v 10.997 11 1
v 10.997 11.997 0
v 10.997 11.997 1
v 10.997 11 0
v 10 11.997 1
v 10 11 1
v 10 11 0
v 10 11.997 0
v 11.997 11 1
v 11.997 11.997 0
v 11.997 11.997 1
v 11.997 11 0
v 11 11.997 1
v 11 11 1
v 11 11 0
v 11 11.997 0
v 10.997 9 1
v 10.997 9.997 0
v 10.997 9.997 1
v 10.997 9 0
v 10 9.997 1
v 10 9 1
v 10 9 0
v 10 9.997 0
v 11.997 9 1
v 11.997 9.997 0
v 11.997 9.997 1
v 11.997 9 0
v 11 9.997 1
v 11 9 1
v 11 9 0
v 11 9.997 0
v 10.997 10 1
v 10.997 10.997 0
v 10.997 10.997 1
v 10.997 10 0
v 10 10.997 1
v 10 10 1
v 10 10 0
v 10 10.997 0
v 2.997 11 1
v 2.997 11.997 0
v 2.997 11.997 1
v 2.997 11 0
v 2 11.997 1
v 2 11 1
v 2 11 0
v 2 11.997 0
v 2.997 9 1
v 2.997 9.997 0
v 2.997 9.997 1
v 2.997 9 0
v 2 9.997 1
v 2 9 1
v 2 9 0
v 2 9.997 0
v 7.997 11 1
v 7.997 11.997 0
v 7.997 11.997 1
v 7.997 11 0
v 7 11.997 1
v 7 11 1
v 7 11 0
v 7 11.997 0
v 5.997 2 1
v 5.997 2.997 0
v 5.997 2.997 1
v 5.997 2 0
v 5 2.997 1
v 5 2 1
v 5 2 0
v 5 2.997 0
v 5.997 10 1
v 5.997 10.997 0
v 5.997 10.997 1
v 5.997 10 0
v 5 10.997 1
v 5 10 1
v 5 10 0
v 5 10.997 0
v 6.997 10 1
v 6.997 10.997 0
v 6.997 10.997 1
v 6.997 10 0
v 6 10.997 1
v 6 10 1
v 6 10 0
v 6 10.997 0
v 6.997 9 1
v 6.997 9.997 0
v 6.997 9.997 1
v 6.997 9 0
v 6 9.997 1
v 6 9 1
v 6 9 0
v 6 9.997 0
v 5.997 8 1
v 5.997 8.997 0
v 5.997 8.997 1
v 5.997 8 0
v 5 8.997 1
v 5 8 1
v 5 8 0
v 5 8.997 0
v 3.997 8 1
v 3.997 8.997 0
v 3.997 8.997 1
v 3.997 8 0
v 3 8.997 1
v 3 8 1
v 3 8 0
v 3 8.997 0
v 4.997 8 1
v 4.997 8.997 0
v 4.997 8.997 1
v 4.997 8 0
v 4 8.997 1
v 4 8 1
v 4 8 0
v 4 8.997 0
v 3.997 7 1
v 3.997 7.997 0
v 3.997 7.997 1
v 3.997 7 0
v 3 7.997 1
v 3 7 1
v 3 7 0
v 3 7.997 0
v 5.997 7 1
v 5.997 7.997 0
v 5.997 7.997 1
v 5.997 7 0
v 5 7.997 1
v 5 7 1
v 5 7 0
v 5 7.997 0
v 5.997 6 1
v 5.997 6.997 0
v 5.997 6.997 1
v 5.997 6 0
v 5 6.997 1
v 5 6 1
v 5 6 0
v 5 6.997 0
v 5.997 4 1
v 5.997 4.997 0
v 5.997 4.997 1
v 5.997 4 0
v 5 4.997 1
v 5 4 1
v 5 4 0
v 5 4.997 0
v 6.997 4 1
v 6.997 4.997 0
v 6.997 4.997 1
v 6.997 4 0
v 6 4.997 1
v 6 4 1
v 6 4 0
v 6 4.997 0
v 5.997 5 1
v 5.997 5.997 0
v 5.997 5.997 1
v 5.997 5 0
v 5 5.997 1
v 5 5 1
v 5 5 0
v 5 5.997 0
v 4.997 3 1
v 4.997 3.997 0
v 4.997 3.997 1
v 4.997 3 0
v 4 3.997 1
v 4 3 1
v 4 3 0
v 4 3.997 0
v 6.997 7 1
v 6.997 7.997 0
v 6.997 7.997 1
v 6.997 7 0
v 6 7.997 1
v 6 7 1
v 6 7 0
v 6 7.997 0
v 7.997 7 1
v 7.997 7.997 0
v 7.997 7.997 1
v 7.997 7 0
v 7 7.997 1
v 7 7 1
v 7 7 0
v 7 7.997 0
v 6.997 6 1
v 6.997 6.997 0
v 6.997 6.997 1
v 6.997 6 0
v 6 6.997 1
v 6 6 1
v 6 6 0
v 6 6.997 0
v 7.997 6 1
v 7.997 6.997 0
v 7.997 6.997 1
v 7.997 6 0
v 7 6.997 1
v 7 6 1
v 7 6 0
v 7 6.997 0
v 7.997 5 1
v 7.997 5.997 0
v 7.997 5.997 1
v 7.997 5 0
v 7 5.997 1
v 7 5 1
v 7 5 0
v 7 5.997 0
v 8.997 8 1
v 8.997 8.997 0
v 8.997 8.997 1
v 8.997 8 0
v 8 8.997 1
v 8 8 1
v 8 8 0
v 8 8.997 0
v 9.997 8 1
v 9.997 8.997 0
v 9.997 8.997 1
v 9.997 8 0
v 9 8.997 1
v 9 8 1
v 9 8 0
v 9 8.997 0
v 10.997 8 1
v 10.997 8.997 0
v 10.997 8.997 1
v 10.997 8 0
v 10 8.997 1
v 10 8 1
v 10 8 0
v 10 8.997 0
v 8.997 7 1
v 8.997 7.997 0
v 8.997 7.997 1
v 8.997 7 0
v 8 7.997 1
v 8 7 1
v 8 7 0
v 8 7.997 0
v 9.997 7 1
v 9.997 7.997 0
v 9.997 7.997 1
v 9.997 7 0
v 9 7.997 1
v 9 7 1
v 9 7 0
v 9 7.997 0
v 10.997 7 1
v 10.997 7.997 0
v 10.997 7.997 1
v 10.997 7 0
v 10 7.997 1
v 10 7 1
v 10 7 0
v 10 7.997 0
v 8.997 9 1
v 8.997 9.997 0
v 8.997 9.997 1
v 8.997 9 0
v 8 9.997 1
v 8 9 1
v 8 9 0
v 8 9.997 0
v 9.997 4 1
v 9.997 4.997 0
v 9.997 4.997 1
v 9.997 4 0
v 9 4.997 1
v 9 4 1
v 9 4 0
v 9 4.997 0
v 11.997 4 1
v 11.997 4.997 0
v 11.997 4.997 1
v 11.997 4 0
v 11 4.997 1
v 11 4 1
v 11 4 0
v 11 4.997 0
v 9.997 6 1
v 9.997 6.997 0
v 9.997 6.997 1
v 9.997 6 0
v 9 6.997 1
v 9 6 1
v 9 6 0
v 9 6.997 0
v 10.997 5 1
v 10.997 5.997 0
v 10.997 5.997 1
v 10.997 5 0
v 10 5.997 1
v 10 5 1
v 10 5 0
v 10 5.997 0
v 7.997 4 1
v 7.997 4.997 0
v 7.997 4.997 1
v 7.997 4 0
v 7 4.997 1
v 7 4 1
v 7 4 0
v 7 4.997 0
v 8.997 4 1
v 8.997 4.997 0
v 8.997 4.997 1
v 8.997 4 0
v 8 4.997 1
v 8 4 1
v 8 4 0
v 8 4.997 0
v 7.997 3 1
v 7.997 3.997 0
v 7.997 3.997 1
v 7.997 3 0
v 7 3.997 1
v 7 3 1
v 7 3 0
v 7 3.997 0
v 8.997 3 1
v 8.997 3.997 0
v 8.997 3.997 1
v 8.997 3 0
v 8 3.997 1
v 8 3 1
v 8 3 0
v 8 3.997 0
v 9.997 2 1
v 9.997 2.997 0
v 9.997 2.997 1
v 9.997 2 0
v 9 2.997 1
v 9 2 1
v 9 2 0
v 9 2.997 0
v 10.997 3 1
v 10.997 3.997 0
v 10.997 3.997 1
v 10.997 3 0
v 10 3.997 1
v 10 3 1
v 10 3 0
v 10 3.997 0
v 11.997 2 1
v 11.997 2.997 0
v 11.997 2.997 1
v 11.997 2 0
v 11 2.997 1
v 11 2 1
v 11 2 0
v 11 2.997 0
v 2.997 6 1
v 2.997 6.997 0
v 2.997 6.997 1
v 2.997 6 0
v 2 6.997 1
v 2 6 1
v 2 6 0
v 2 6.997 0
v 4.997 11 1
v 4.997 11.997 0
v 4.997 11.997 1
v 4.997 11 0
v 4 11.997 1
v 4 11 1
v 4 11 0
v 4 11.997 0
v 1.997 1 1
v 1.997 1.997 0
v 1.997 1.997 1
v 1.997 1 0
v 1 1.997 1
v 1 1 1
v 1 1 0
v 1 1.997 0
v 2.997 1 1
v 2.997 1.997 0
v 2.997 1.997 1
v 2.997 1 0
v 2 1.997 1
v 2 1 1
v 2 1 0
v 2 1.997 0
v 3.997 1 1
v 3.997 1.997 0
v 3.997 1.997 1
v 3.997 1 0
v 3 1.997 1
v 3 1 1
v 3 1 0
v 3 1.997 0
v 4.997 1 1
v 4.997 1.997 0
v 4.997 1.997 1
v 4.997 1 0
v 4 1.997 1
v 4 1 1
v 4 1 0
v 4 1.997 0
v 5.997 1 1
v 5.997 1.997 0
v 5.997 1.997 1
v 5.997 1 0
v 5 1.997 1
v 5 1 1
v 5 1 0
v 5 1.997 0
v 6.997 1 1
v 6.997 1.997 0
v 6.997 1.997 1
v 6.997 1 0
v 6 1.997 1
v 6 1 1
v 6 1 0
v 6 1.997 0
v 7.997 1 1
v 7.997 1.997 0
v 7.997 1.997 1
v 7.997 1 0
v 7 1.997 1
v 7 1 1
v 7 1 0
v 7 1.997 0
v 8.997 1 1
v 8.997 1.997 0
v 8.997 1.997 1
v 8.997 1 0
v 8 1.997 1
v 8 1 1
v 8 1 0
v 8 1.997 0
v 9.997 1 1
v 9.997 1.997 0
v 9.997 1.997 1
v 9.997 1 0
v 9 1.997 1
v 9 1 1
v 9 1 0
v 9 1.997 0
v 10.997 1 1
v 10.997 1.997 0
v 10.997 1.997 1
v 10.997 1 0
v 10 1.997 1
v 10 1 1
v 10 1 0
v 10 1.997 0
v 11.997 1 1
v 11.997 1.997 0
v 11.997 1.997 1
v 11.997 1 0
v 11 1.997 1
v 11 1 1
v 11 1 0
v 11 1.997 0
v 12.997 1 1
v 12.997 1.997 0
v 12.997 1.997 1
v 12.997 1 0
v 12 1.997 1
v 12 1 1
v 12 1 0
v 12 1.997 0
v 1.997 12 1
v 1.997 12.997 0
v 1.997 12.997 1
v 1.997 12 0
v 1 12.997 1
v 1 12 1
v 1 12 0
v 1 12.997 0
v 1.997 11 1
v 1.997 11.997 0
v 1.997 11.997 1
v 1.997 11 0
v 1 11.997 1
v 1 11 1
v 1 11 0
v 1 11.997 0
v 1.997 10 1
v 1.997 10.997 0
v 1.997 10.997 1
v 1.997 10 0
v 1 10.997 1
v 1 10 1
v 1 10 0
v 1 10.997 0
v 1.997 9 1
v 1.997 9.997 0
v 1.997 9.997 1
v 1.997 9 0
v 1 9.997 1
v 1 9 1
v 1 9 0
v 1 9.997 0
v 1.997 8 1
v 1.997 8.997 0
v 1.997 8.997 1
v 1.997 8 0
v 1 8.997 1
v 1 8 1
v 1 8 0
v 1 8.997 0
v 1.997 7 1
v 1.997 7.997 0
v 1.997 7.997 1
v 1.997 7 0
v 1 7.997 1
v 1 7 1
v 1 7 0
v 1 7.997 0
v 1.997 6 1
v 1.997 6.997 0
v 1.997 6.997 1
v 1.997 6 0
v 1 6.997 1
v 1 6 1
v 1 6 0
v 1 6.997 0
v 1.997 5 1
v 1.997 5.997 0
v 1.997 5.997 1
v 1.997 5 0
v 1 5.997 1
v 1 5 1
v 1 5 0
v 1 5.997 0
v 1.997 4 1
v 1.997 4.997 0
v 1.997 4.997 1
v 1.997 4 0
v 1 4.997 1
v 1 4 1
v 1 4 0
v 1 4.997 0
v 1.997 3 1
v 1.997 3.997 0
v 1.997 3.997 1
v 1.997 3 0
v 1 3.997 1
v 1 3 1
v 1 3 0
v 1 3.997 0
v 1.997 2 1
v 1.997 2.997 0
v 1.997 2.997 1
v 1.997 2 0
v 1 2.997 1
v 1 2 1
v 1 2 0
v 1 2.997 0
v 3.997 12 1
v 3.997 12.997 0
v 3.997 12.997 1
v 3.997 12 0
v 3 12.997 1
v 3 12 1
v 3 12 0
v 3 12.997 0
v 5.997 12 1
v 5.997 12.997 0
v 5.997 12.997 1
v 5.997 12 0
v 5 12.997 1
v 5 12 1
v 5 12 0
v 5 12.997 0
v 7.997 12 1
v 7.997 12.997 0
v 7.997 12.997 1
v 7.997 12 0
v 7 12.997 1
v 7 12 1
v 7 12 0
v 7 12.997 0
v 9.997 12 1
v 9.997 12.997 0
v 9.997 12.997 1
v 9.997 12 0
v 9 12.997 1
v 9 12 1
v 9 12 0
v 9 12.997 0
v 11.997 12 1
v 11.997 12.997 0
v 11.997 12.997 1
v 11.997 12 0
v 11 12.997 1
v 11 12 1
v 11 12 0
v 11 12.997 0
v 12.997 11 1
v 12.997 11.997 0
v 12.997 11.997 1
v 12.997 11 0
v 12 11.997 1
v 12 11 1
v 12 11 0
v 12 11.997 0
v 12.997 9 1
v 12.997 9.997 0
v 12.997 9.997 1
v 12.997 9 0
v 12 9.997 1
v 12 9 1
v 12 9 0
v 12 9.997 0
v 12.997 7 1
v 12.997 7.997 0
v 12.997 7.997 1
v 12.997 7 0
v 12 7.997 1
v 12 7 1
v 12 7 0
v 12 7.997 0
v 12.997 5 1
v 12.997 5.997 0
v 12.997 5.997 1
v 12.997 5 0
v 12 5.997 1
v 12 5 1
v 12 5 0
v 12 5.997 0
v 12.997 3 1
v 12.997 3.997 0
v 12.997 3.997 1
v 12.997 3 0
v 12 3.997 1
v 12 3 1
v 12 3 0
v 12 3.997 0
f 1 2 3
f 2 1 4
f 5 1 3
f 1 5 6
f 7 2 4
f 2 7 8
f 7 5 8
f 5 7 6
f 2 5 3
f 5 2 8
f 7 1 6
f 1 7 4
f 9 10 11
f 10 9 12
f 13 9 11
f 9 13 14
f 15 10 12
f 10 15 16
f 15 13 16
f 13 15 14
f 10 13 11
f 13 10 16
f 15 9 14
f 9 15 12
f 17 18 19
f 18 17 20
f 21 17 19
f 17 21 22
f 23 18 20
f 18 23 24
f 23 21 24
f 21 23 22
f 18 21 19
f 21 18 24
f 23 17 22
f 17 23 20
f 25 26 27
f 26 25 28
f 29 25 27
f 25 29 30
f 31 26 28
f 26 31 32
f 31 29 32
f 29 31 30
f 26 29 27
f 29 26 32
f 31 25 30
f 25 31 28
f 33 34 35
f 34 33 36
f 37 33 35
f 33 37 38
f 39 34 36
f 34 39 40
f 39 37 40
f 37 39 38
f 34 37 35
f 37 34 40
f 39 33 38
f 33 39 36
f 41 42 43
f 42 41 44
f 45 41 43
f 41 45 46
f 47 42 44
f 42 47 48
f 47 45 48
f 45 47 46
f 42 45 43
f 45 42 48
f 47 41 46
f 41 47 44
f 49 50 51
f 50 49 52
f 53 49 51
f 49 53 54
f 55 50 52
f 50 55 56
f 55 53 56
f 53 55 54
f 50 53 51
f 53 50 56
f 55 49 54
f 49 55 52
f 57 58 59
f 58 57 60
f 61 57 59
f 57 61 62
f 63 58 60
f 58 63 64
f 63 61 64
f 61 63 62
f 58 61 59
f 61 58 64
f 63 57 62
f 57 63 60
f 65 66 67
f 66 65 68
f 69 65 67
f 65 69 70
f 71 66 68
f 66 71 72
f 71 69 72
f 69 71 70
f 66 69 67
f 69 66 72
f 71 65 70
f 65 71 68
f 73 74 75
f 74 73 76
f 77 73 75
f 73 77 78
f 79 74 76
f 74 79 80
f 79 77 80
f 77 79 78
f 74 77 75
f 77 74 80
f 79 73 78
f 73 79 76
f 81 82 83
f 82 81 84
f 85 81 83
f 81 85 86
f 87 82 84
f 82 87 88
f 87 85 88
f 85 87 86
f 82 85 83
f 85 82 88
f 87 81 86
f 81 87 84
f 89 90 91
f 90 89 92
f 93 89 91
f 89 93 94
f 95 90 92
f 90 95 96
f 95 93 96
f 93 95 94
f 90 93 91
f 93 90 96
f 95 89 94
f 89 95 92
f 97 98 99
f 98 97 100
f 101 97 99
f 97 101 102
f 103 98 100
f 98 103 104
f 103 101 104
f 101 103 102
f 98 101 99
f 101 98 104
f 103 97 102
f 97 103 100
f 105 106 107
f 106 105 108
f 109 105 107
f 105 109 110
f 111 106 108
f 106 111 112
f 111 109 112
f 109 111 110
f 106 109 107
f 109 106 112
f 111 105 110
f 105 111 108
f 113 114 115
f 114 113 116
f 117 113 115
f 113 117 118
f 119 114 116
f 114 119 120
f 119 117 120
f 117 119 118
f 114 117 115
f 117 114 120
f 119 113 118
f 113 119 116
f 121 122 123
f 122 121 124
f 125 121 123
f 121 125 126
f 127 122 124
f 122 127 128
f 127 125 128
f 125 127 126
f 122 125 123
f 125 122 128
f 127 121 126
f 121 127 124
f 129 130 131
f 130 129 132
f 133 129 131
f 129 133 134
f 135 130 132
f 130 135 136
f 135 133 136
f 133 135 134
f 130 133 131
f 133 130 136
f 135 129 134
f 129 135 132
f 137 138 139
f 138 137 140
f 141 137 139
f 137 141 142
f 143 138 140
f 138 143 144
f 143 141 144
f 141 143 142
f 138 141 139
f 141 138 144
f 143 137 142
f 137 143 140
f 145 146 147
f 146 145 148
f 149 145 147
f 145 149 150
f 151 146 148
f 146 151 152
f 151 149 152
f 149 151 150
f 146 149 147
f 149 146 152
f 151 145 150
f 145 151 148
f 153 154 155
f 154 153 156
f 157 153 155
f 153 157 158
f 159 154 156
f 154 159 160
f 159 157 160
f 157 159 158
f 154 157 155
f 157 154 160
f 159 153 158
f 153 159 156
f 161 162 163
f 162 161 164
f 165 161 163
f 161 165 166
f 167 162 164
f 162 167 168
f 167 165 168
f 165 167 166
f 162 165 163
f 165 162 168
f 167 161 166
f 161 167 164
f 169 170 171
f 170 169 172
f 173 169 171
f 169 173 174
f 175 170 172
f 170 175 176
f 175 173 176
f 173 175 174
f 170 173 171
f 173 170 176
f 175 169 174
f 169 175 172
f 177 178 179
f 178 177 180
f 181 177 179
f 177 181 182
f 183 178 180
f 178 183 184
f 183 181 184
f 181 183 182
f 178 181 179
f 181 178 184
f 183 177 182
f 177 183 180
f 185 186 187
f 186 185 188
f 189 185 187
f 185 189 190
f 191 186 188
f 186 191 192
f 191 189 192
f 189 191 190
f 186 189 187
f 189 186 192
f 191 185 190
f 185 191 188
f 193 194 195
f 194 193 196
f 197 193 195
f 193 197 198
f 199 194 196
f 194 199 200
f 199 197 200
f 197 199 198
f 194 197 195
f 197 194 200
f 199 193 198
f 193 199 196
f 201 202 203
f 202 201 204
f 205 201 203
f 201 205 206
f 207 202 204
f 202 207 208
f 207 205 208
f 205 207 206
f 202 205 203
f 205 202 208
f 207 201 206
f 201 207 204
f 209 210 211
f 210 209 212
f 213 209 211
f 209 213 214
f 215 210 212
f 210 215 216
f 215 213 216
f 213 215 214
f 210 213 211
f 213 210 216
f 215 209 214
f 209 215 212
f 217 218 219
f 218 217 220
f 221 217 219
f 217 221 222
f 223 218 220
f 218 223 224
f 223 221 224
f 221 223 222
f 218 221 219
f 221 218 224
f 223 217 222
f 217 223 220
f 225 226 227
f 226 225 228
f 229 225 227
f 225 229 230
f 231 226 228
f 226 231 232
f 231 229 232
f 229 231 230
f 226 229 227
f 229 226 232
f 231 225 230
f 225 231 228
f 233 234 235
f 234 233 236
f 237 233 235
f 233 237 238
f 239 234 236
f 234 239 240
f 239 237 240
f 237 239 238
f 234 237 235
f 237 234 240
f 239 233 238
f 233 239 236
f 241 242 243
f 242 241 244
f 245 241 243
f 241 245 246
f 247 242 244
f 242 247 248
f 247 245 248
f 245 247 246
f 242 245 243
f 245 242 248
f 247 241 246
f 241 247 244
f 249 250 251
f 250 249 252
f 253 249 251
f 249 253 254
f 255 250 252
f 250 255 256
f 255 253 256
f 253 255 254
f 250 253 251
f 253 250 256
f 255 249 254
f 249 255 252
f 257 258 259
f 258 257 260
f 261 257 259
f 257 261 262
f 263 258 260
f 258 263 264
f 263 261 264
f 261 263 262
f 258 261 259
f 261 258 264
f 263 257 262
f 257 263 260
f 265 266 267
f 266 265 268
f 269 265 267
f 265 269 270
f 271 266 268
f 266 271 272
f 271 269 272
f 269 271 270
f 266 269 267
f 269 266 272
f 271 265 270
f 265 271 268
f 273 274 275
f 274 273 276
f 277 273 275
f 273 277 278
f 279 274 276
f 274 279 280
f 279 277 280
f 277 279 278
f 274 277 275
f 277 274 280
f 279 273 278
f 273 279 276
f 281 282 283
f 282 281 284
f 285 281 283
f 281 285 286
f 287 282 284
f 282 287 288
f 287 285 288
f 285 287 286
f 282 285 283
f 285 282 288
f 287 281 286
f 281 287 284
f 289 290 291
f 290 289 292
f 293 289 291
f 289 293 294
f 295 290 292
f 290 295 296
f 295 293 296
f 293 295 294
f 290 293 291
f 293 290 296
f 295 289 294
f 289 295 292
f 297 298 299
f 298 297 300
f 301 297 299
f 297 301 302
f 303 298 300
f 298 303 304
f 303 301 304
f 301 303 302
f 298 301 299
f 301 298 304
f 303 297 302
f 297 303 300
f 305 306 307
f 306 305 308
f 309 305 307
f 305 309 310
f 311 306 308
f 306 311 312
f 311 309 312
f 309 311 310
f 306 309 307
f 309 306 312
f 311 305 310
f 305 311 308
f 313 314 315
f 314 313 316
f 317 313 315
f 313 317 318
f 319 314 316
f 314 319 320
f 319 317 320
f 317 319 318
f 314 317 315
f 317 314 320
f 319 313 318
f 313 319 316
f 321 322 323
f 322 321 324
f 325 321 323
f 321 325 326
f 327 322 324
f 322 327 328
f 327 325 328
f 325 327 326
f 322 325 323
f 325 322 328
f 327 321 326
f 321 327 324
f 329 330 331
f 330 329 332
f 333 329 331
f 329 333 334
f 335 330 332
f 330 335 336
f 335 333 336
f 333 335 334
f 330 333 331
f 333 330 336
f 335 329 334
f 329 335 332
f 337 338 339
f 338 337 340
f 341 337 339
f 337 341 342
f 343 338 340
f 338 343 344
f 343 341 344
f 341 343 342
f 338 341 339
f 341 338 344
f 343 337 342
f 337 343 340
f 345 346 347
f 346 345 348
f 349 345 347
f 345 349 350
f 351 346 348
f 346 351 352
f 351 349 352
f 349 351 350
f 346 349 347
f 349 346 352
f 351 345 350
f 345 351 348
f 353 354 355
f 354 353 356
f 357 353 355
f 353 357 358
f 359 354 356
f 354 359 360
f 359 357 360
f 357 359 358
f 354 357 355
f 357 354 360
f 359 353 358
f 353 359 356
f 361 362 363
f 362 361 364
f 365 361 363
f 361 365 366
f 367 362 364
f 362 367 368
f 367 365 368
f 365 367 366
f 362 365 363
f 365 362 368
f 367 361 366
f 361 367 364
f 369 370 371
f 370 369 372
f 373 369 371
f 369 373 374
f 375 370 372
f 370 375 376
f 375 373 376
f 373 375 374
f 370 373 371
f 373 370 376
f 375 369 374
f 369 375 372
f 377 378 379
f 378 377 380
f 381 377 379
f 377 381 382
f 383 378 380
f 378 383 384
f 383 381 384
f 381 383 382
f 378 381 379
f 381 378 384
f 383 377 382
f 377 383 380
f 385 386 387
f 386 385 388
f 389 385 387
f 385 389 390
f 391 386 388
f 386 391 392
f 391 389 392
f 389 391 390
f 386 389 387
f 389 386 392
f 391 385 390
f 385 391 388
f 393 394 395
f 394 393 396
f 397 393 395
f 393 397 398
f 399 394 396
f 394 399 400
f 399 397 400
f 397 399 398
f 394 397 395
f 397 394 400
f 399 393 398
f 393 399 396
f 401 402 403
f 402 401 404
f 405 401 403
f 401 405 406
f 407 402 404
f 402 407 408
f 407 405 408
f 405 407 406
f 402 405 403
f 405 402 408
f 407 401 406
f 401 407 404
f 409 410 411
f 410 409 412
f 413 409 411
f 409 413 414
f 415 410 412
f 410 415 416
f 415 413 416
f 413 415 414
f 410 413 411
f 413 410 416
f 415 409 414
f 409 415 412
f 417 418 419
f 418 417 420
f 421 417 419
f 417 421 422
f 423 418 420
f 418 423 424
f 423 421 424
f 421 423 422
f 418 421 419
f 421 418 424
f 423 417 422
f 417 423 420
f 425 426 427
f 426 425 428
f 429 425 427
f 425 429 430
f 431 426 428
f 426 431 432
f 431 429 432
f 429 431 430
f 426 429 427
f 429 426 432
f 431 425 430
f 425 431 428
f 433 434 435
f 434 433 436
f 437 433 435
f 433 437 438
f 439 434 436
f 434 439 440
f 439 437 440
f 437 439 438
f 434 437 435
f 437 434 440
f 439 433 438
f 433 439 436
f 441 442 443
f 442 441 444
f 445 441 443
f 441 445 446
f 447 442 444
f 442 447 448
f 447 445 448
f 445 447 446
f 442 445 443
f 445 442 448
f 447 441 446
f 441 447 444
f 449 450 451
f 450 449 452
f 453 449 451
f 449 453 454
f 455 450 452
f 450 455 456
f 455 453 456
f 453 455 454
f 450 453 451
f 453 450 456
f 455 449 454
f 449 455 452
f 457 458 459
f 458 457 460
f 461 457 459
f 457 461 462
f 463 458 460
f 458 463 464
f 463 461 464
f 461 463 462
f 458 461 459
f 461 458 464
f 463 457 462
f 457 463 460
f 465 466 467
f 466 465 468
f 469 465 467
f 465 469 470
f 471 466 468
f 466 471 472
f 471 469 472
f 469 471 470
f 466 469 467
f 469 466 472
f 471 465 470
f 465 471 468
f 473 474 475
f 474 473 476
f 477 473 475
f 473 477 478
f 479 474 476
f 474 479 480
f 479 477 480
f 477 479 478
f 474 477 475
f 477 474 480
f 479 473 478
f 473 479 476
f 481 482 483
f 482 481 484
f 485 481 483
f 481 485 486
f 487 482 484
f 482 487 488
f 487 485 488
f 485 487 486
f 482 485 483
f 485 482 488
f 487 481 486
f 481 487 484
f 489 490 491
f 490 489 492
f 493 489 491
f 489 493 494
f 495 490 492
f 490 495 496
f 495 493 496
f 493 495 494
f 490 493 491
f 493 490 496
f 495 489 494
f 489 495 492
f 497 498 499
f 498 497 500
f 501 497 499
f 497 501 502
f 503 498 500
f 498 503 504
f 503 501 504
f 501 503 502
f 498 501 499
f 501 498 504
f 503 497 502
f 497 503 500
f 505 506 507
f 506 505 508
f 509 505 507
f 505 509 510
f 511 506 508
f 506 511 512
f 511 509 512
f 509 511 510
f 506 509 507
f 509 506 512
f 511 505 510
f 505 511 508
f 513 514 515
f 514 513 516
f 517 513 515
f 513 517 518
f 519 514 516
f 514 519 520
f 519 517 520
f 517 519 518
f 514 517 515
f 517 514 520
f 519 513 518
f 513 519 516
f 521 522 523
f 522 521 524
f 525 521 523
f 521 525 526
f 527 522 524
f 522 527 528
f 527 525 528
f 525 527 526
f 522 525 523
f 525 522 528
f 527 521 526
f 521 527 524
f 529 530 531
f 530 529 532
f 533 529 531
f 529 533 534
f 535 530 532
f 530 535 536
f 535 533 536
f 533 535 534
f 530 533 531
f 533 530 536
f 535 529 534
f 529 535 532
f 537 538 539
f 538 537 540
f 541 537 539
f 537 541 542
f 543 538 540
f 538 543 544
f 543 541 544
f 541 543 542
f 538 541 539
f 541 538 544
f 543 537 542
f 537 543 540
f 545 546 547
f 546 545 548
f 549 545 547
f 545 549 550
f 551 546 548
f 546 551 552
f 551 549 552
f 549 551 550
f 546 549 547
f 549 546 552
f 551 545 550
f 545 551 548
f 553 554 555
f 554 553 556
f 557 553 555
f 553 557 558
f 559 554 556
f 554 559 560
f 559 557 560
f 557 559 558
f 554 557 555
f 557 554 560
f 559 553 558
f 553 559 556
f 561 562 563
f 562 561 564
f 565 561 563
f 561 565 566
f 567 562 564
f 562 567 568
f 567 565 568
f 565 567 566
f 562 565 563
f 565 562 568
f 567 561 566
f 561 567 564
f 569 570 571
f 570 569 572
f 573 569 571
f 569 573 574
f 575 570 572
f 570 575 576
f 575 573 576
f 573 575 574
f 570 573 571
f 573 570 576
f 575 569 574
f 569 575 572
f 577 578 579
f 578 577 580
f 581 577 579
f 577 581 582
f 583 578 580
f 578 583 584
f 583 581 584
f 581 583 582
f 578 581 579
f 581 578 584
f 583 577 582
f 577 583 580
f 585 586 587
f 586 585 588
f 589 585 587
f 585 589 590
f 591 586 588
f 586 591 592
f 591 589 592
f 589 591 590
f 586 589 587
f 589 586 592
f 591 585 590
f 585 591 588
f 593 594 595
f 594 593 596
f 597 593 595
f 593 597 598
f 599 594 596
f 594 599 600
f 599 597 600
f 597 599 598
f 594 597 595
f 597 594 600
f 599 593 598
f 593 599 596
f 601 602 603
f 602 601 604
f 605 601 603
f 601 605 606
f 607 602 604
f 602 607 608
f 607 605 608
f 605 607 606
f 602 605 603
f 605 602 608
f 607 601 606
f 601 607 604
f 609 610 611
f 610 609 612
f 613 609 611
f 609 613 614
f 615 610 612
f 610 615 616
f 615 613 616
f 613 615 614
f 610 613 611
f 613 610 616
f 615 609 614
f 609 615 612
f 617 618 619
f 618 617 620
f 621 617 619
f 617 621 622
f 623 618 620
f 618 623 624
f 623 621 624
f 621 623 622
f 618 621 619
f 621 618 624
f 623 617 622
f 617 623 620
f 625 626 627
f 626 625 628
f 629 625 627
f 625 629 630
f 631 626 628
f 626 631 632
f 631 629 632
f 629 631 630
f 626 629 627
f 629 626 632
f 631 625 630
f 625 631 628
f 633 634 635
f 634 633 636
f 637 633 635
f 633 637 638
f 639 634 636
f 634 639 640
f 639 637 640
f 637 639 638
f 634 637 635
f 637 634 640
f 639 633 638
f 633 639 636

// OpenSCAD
// file: ../../util/bitmap.scad
/*****************************************************************************
 * Module Bitmap Library
 * Modules to create bitmaps of unit squares from 1 or 2 dimensional vectors.
 *****************************************************************************
 * Copyright 2017 Chris Baker
 *
 * This program is free software: you can redistribute it and/or modify
 * it under the terms of the GNU Lesser General Public License as published by
 * the Free Software Foundation, either version 3 of the License, or
 * (at your option) any later version.
 *
 * This program is distributed in the hope that it will be useful,
 * but WITHOUT ANY WARRANTY; without even the implied warranty of
 * MERCHANTABILITY or FITNESS FOR A PARTICULAR PURPOSE.  See the
 * GNU Lesser General Public License for more details.
 *
 * You should have received a copy of the GNU Lesser General Public License
 * along with this program.  If not, see <http://www.gnu.org/licenses/>.
 *****************************************************************************
 * Usage:
 * Include this file with the "use" tag.
 * Depends on compat.scad library.
 *
 * API:
 *   1dbitmap(bitmap, center, pullback, vector_mode)
 *   2dbitmap(bitmap, center, pullback, vector_mode)
 *     Generate a 1 or 2-Dimensional field of modules based on the provided
 *     bitmap vector. See Bitmap Vectors below.
 *     The center flag determines whether to center the bitmap on the origin.
 *     The pullback value shrinks each module in the x and y dimension by the
 *     specified amount. A negative value will expand the modules so they
 *     blend into each other.
 *     The vector_mode flag determines whether to create 3D solid geometry
 *     (unit cubes) or 2D vector geometry (squares).
 *
 * Bitmap Vectors:
 *   The bitmap vectors primarily provide boolean information.
 *   A module will be placed where these vectors have a postive value and
 *   skipped where they have a negative value. I.E. 0, -1, false, and undef
 *   are all equivalent and result in a skip. 1 and true are equivalent and
 *   result in a placed 1-unit module.
 *   Further, if the value is an integer it will be treated as a height for
 *   the module, allowing z-maps to be created.
 *   If the value is not an integer or boolean, it will be treated as a color
 *   reference. This can be a string or RGBA vector that will be used to
 *   color the module in the OpenSCAD preview window.
 *   In current versions of OpenSCAD, the color has no effect in the rendered
 *   view or STL output.
 *
 * Vector Mode:
 *   Although OpenSCAD supports generating 2D geometry, there are several
 *   caveats:
 *   - 2D and 3D geometry cannot be mixed
 *   - Extruding 2D geometry causes color information to be lost
 *   - All 2D geometry is projected onto the XY plane when rendering
 *   - Rendering also results in loss of color (same as 3D)
 *   - The SVG exporter is somewhat limited:
 *     - The pixel size of the image is hard-coded in the file
 *     - The title of the image is a generic string
 *     - The color selection for stroke and fill is fixed
 *     - The stroke-width is set to a large value that will cause overlap
 *     - The background is transparent
 *     - Only one path element is created with all of the geometry; there is
 *       no easy way to split up the geometry into multiple logical units.
 *     - These issues can mostly be resolved by hand-editing the file:
 *       - Remove or modify the width and height parameters from the svg
 *         element at the top of the file to provide better scaling.
 *       - Edit the title element at the top of the file to change the title.
 *       - Edit the stroke and fill parameters of the path element (these will
 *         probably be at the end of the file).
 *       - Set the stroke-width parameter for the path element to 0.
 *****************************************************************************/
use <compat.scad>

/*
 * 2dbitmap - Turn a 2D vector into a bitmap of cubes
 *
 * bitmap - 2D vector representing where to place each cube
 *          Value can either be boolean, z-height, or color
 * center - center cubes around the origin
 * pullback - size of gap around each pixel (screendoor)
 * vector_mode - create a 2D vector drawing instead of 3D extrusion
 */
module 2dbitmap(bitmap=[[1,0],[0,1]], center=false, pullback=0.003, vector_mode=false)
{
  if (bitmap!=undef) {
	ylen=len(bitmap)-1;

	for (y=[0:ylen]) {
		xlen=len(bitmap[y])-1;
		for (x=[0:xlen])
			translate([x-(center?xlen/2:0),ylen-y-(center?ylen/2:0),0])
				if (is_indexable(bitmap[y][x]))
					color(bitmap[y][x])
						if (vector_mode)
							square([1-pullback,1-pullback], center=center);
						else
							cube([1-pullback,1-pullback,1], center=center);
				else
					if (bitmap[y][x])
						if (vector_mode)
							square([1-pullback,1-pullback], center=center);
						else
							cube([1-pullback,1-pullback,clamp_nonnum(bitmap[y][x])], center=center);
	}
  }
}

module 1dbitmap(bitmap=[1,0,1,0,1], center=false, pullback=-0.003, vector_mode=false)
	if (bitmap!=undef)
		2dbitmap([bitmap], center, pullback, vector_mode);

/*
 * Examples
 */

// 1D with z-height
translate([10,0,0]) scale([1,10,1])
	1dbitmap(bitmap=[1,1,0,2,0,0,3], pullback=.1);

// 1D with boolean
translate([-20,0,0]) scale([1,10,1])
	1dbitmap(bitmap=[true,false,true,false,true,true]);

// 2D with z-height
scale([2,2,1])
	2dbitmap(bitmap=[[1,0,2,1],[0,3,3,0],[1,1,0,1]],
		center=true);

// 1D with color
translate([0,-10,0]) scale([1,3,1])
	1dbitmap(bitmap=["red","white","blue",[0,0.3,0,0.5]]);

// 1D with color using 2D-vector-mode
translate([-7,-8,0]) scale([1,2])
	1dbitmap(bitmap=["red",0,"blue",0,"green"], vector_mode=true);
translate([-4.5,-10,0]) scale([1,2])
	1dbitmap(bitmap=["red",0,"blue",0,"green"], vector_mode=true, center=true);

// Check behavior with undef
1dbitmap(undef);
2dbitmap(undef);
// file: ../../util/bitlib.scad
/*****************************************************************************
 * Bit Manipulation Library
 * Provides some useful bit manipulation functions.
 *****************************************************************************
 * Copyright 2017 Chris Baker
 *
 * This program is free software: you can redistribute it and/or modify
 * it under the terms of the GNU Lesser General Public License as published by
 * the Free Software Foundation, either version 3 of the License, or
 * (at your option) any later version.
 *
 * This program is distributed in the hope that it will be useful,
 * but WITHOUT ANY WARRANTY; without even the implied warranty of
 * MERCHANTABILITY or FITNESS FOR A PARTICULAR PURPOSE.  See the
 * GNU Lesser General Public License for more details.
 *
 * You should have received a copy of the GNU Lesser General Public License
 * along with this program.  If not, see <http://www.gnu.org/licenses/>.
 *****************************************************************************
 * Usage:
 * Include this file with the "use" tag.
 * When run on its own, all echo statements in this library should print
 * "true".
 *
 * API:
 *   bit(v,b)
 *     Return the truth value of the b'th bit of v.
 *
 *   check_bit_size(v,b,signed=false)
 *     Determine whether the value v can be represented with b bits (b must
 *     be positive).
 *     The signed flag indicates whether to include the sign bit in the
 *     determination; otherwise negative values will result in undef being
 *     returned.
 *
 *   xor(a,b)
 *     Return the value of a xor b.
 *     Handles arbitrary size values for a and b.
 *     Handles negative values as expected (a positive result will be returned
 *     unless a and b have differing signs).
 *
 * TODO:
 *  - Change echos to asserts (future OpenSCAD version)
 *  - Add more functions
 *
 *****************************************************************************/

//Return the truth value of the b'th bit of v
function bit(v,b) =
	((v==undef)||(b==undef)||(b<0))?undef:
	(floor(v / pow(2, b)) % 2)?true:false;

echo("*** bit() testcases ***");
echo(0,bit(0,0)==false);
echo(1,bit(-1,0)==true);
echo(2,bit(1,0)==true);
echo(3,[for (i=[0:63]) bit(0,i)]==[for (i=[0:63]) false]); //0=0...0
echo(4,[for (i=[0:63]) bit(-1,i)]==[for (i=[0:63]) true]); //-1=1...1
echo(5,[for (i=[1:63]) bit(1,i)]==[for (i=[1:63]) false]); //1=0...01
echo(6,[for (i=[0:7]) bit(85,i)?1:0]==[1,0,1,0,1,0,1,0]); //85=01010101
echo(7,[for (i=[0:7]) bit(170,i)?1:0]==[0,1,0,1,0,1,0,1]); //170=10101010
echo(8,[for (i=[0:7]) bit(165,i)?1:0]==[1,0,1,0,0,1,0,1]); //165=10100101
echo(9,[for (i=[0:7]) bit(56,i)?1:0]==[0,0,0,1,1,1,0,0]); //56=00111000
echo(10,[for (i=[0:7]) bit(-3,i)?1:0]==[1,0,1,1,1,1,1,1]); //-3=1...101
//(2^64)=0...01 0...0
echo(11,bit(pow(2,64),64)==true);
echo(12,[for (i=[0:63]) bit(pow(2,64),i)]==[for (i=[0:63]) false]);
echo(13,[for (i=[65:127]) bit(pow(2,64),i)]==[for (i=[1:63]) false]);
//-(2^64)=1...1 0...0
echo(14,[for (i=[0:63]) bit(-pow(2,64),i)]==[for (i=[0:63]) false]);
echo(15,[for (i=[64:127]) bit(-pow(2,64),i)]==[for (i=[0:63]) true]);
echo(16,bit(10,-1)==undef);
echo(17,bit(10,undef)==undef);
echo(18,bit(undef,3)==undef);

//return true if v can be represented in b bits
//if signed flag is set. the result will be adjusted
//to account for the needed sign bit
function check_bit_size(v,b,signed=false) =
	(b<0)?undef:
	(v==undef)?undef:
	(b==0)?false:
	(v==0)?true: //(b>0)
	(signed)?
		(v<0)?(-pow(2,b-1)<(v+1)):
			(pow(2,b-1)>(v+1)):
		(v<0)?undef:
			(pow(2,b)>v);

echo("*** check_bit_size() testcases ***");
echo(0,check_bit_size(-1,2)==undef);
echo(1,check_bit_size(2,-4)==undef);
echo(2,check_bit_size(2,-4,signed=true)==undef);
echo(3,check_bit_size(0,0)==false);
echo(4,check_bit_size(0,1)==true);
echo(5,check_bit_size(1,0)==false);
echo(6,check_bit_size(1,1)==true);
echo(7,check_bit_size(7,3)==true);
echo(8,check_bit_size(8,3)==false);
echo(9,check_bit_size(1,3)==true);
echo(10,check_bit_size(256,8)==false);
echo(11,check_bit_size(255,8)==true);
echo(12,check_bit_size(10,2)==false);
echo(13,check_bit_size(10,4)==true);
echo(14,check_bit_size(-10,2,signed=true)==false);
echo(15,check_bit_size(-10,4,signed=true)==false);
echo(16,check_bit_size(-10,5,signed=true)==true);
echo(17,check_bit_size(-1,0,signed=true)==false);
echo(18,check_bit_size(-1,1,signed=true)==true);
echo(19,check_bit_size(0,0,signed=true)==false);
echo(20,check_bit_size(0,1,signed=true)==true);
echo(21,check_bit_size(-2,2,signed=true)==true);
echo(22,check_bit_size(-3,2,signed=true)==false);
echo(23,check_bit_size(-3,3,signed=true)==true);
echo(24,check_bit_size(-8,3,signed=true)==false);
echo(25,check_bit_size(-8,4,signed=true)==true);
echo(26,check_bit_size(undef,4)==undef);
echo(27,check_bit_size(undef,4,signed=true)==undef);

//return the value of a xor b
//runs recursively until all bits of a and b are exhausted
function xor(a,b,i=0) =
	((a==undef)||(b==undef))?undef:
	let (c=bit(a,i), d=bit(b,i),
		 v=((c||d) && !(c&&d))?pow(2,i):0)
		(check_bit_size(a,i,signed=true) &&
		 check_bit_size(b,i,signed=true))?
			-v: //special case for sign bit
			v+xor(a,b,i+1); //recursively add powers of 2

echo("*** xor() testcases ***");
echo(0,xor(42,0)==42);
echo(1,xor(42,42)==0);
echo(2,xor(169,238)==71); //10101001^11101110=01000111=71
echo(3,xor(238,169)==71);
echo(4,xor(42,238)==196); //00101010^11101110=11000100=196
echo(5,xor(169,42)==131); //10101001^00101010=10000011=131
echo(6,xor(-8,-10)==14); //11000^10110=01110=14
echo(7,xor(-7,-10)==15); //11001^10110=01111=15
echo(8,xor(9,-10)==-1); //01001^10110=11111=-1
echo(9,xor(9,-12)==-3); //01001^10100=11101=-3
echo(10,xor(undef,0)==undef);
// file: ../../util/stringlib.scad
/*****************************************************************************
 * String Manipulation Library
 * Provides some useful string manipulation functions.
 *****************************************************************************
 * Copyright 2017 Chris Baker
 *
 * This program is free software: you can redistribute it and/or modify
 * it under the terms of the GNU Lesser General Public License as published by
 * the Free Software Foundation, either version 3 of the License, or
 * (at your option) any later version.
 *
 * This program is distributed in the hope that it will be useful,
 * but WITHOUT ANY WARRANTY; without even the implied warranty of
 * MERCHANTABILITY or FITNESS FOR A PARTICULAR PURPOSE.  See the
 * GNU Lesser General Public License for more details.
 *
 * You should have received a copy of the GNU Lesser General Public License
 * along with this program.  If not, see <http://www.gnu.org/licenses/>.
 *****************************************************************************
 * Usage:
 * Include this file with the "use" tag.
 * Depends on compat.scad library.
 *
 * API:
 *   atoi(a)
 *     Convert the string of numerals, a, to a vector of individual decimal
 *     numbers.
 *
 *   ascii_to_vec(a)
 *     Convert the ASCII string, a, into a vector of decimal numbers.
 *
 *****************************************************************************/
use <compat.scad>

/*
 * atoi - convert ASCII numerals to a vector of individual decimal numbers
 *
 * a - the ASCII string of numerals
 */
function atoi(a) = (isa_string(a))?
	[
		let (val = search(a, "0123456789"))
			for (i = val) i
	]
	:
	undef;

/* *** atoi() testcases *** */
do_assert(atoi(undef)==undef,     "atoi test 00");
do_assert(atoi(true)==undef,      "atoi test 01");
do_assert(atoi(false)==undef,     "atoi test 02");
do_assert(atoi([])==undef,        "atoi test 03");
do_assert(atoi([1,2,3])==undef,   "atoi test 04");
do_assert(atoi("")==[],           "atoi test 05");
do_assert(atoi("0")==[0],         "atoi test 06");
do_assert(atoi("1")==[1],         "atoi test 07");
do_assert(atoi("2")==[2],         "atoi test 08");
do_assert(atoi("3")==[3],         "atoi test 09");
do_assert(atoi("4")==[4],         "atoi test 10");
do_assert(atoi("5")==[5],         "atoi test 11");
do_assert(atoi("6")==[6],         "atoi test 12");
do_assert(atoi("7")==[7],         "atoi test 13");
do_assert(atoi("8")==[8],         "atoi test 14");
do_assert(atoi("9")==[9],         "atoi test 15");
do_assert(atoi("123")==[1,2,3],   "atoi test 16");
do_assert(atoi("1a23b")==[1,2,3], "atoi test 17"); //degenerate case, don't really care too much about the result

/*
 * ascii_to_vec - convert ASCII string to decimal vector
 *
 * a - the ASCII string to vectorize
 */
function ascii_to_vec(a) = (isa_string(a))?
	[
		let (val = search(a, "\x01\x02\x03\x04\x05\x06\x07\x08\x09\x0a\x0b\x0c\x0d\x0e\x0f\x10\x11\x12\x13\x14\x15\x16\x17\x18\x19\x1a\x1b\x1c\x1d\x1e\x1f !\"#$%&'()*+,-./0123456789:;<=>?@ABCDEFGHIJKLMNOPQRSTUVWXYZ[\\]^_`abcdefghijklmnopqrstuvwxyz{|}~\x7f"))
			for (i = val) i+1
	]:
	undef;

/* *** ascii_to_vec() testcases *** */
do_assert(ascii_to_vec(undef)==undef,   "ascii_to_vec test 01");
do_assert(ascii_to_vec(true)==undef,    "ascii_to_vec test 02");
do_assert(ascii_to_vec(false)==undef,   "ascii_to_vec test 03");
do_assert(ascii_to_vec([])==undef,      "ascii_to_vec test 04");
do_assert(ascii_to_vec([1,2,3])==undef, "ascii_to_vec test 05");
do_assert(ascii_to_vec("")==[],         "ascii_to_vec test 06");
do_assert(ascii_to_vec("0")==[48],      "ascii_to_vec test 07");
do_assert(ascii_to_vec("a")==[97],      "ascii_to_vec test 08");
do_assert(ascii_to_vec("0123456789")==[48,49,50,51,52,53,54,55,56,57],
	"ascii_to_vec test 09");
do_assert(ascii_to_vec("The quick brown fox jumped over the lazy dog.")
	==[84,104,101,32,113,117,105,99,107,32,98,114,111,119,110,32,102,111,120,32,106,117,109,112,101,100,32,111,118,101,114,32,116,104,101,32,108,97,122,121,32,100,111,103,46],
	"ascii_to_vec test 10");
// main file
/* Unit Test 03: 12x12 - 5 data bytes, 7 ecc bytes - c40 mode */
use <../datamatrix.scad>
data_matrix(
		concat(
			c40_mode(),
			dm_c40("H0VLP7")
		),
		mark="black");
